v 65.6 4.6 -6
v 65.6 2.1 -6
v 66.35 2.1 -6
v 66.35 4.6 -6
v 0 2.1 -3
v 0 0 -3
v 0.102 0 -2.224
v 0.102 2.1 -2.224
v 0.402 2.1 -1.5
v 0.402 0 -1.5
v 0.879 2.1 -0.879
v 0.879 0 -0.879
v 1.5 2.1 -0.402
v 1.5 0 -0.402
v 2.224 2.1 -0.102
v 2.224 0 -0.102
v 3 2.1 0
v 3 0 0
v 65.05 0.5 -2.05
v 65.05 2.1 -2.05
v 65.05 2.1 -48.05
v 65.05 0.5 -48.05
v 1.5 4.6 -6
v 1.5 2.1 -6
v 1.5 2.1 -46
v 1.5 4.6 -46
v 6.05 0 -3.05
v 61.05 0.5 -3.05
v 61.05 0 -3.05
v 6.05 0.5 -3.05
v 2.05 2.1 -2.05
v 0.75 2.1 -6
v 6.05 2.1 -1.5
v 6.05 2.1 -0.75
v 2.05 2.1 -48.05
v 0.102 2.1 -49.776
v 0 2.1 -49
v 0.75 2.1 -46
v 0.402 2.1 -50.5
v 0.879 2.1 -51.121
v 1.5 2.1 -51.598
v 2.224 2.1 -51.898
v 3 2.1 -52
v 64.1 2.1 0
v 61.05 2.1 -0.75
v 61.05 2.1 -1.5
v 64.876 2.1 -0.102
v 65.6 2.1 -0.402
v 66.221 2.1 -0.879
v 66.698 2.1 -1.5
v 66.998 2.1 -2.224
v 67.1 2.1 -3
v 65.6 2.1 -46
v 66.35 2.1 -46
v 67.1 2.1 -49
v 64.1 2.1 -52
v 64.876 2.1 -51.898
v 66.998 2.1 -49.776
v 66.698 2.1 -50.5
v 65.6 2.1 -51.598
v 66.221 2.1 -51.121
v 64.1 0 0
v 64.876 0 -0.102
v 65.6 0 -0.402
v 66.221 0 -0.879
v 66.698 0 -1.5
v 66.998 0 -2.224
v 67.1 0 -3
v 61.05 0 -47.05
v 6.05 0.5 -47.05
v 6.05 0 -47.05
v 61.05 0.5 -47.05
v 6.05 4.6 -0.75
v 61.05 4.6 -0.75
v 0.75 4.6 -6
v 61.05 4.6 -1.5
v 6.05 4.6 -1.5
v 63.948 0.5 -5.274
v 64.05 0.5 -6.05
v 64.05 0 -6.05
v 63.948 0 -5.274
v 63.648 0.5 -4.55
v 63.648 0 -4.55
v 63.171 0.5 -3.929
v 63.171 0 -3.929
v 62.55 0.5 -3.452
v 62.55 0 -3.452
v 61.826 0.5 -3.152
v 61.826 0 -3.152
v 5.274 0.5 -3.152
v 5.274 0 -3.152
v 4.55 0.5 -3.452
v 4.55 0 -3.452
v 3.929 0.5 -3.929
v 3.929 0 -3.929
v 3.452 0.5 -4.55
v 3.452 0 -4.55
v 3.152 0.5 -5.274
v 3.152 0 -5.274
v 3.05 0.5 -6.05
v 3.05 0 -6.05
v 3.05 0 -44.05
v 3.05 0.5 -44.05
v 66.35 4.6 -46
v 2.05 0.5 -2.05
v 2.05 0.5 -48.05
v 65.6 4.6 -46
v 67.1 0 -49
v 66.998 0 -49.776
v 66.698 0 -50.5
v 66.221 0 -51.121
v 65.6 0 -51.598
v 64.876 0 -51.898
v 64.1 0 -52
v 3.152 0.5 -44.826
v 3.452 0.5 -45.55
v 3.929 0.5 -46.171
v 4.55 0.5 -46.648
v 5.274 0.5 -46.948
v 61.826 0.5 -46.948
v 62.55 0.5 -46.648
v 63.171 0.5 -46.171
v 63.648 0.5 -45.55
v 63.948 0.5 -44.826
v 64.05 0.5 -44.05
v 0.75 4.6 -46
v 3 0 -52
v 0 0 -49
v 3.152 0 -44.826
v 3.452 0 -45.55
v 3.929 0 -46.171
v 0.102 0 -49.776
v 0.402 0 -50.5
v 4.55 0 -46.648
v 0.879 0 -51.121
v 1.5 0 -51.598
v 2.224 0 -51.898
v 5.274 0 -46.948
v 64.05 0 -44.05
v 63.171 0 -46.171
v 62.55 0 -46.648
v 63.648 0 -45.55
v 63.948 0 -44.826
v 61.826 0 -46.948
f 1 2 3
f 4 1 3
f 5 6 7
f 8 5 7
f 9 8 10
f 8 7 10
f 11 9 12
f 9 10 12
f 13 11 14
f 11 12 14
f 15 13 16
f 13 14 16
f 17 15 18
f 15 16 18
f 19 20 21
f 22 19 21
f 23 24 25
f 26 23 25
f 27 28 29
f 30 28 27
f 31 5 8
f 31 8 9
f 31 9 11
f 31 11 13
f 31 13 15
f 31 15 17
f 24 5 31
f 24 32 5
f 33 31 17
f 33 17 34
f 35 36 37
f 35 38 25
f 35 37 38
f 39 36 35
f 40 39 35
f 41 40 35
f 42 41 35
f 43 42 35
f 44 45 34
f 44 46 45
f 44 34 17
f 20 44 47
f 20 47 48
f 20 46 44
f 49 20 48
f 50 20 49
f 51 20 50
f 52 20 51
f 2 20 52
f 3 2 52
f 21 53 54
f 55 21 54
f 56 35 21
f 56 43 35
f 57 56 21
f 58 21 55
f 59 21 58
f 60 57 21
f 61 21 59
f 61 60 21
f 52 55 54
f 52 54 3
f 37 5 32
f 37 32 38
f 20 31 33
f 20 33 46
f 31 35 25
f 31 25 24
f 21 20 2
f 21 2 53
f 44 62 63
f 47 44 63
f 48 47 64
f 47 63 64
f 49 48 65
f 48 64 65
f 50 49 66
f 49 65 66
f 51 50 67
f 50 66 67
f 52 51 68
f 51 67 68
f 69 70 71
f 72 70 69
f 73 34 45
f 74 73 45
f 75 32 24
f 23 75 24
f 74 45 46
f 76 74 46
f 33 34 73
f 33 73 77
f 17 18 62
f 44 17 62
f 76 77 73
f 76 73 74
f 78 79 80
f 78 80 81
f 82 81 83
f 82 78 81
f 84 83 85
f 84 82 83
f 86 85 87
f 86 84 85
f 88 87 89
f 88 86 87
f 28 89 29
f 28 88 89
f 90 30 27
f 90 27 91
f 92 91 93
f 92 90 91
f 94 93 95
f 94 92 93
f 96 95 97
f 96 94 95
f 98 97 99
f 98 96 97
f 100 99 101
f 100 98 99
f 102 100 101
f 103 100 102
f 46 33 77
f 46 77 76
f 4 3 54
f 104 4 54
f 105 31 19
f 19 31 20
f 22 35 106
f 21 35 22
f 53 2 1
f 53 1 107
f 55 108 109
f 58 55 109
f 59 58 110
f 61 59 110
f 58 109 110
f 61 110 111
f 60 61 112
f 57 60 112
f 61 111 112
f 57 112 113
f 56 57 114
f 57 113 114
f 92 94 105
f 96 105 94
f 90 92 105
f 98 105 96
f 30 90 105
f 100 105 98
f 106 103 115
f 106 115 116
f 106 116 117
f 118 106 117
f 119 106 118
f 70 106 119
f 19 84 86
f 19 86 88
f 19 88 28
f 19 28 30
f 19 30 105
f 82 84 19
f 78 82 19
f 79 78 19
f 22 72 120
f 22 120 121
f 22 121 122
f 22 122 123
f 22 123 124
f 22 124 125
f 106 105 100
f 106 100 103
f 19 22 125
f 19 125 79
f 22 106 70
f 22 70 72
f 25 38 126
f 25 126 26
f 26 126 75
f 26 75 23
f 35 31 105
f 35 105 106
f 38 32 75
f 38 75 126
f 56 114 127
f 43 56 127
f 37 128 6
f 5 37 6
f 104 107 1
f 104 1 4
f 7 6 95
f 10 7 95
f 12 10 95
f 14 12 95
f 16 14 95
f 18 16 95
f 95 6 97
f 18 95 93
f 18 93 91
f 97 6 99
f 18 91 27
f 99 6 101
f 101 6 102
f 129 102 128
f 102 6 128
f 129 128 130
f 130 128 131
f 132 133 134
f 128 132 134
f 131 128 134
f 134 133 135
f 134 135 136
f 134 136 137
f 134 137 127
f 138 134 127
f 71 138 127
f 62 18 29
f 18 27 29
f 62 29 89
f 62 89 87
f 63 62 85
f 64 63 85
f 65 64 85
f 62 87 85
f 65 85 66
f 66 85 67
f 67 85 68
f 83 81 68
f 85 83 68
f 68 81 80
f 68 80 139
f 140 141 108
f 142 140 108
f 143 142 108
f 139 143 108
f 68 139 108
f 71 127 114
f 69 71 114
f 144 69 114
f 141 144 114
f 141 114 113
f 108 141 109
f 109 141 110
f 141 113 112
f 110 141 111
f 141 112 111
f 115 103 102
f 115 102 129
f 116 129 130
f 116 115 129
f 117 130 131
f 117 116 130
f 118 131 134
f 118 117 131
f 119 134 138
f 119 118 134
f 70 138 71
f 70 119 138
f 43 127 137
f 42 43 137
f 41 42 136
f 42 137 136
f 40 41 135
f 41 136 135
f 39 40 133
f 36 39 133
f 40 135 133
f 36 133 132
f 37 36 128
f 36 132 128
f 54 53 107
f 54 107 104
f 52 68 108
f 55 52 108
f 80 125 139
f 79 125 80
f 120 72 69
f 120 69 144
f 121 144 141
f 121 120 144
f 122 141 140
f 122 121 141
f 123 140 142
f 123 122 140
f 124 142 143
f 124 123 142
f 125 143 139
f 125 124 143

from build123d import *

# Parameters (mm, degrees)
BOSS_EXTRUDE1_DEPTH = 2.1
SKETCH3_W           = 63
SKETCH3_H           = 46
CUT_EXTRUDE1_DEPTH  = 1.6
CUT_EXTRUDE2_DEPTH  = 0.5
SKETCH6_W           = 0.75
SKETCH6_H           = 40
SKETCH6_W_2         = 55
SKETCH6_H_2         = 0.75
BOSS_EXTRUDE2_DEPTH = 2.5


with BuildPart() as part:
    # Sketch1 → Boss-Extrude1 (new body)
    with BuildSketch(Plane(origin=(0, 0, 0), x_dir=(1, 0, 0), z_dir=(0, 1, 0))):
        with BuildLine():
            Line((3, 0), (64.1, 0))
            ThreePointArc((64.1, 0), (66.221320344, 0.878679656), (67.1, 3))
            Line((67.1, 3), (67.1, 49))
            ThreePointArc((67.1, 49), (66.221320344, 51.121320344), (64.1, 52))
            Line((64.1, 52), (3, 52))
            ThreePointArc((3, 52), (0.878679656, 51.121320344), (0, 49))
            Line((0, 49), (0, 3))
            ThreePointArc((0, 3), (0.878679656, 0.878679656), (3, 0))
        make_face()
    extrude(amount=BOSS_EXTRUDE1_DEPTH)

    # Sketch3 → Cut-Extrude1 (cut)
    with BuildSketch(Plane(origin=(0, 2.1, 0), x_dir=(1, 0, 0), z_dir=(0, 1, 0))):
        with Locations((33.55, 25.05)):
            Rectangle(SKETCH3_W, SKETCH3_H)
    extrude(amount=-CUT_EXTRUDE1_DEPTH, mode=Mode.SUBTRACT)

    # Sketch5 → Cut-Extrude2 (cut)
    with BuildSketch(Plane(origin=(0, 0.5, 0), x_dir=(1, 0, 0), z_dir=(0, 1, 0))):
        with BuildLine():
            Line((6.05, 47.05), (61.05, 47.05))
            ThreePointArc((61.05, 47.05), (63.171320344, 46.171320344), (64.05, 44.05))
            Line((64.05, 44.05), (64.05, 6.05))
            ThreePointArc((64.05, 6.05), (63.171320344, 3.928679656), (61.05, 3.05))
            Line((61.05, 3.05), (6.05, 3.05))
            ThreePointArc((6.05, 3.05), (3.928679656, 3.928679656), (3.05, 6.05))
            Line((3.05, 6.05), (3.05, 44.05))
            ThreePointArc((3.05, 44.05), (3.928679656, 46.171320344), (6.05, 47.05))
        make_face()
    extrude(amount=-CUT_EXTRUDE2_DEPTH, mode=Mode.SUBTRACT)

    # Sketch6 → Boss-Extrude2 (add)
    with BuildSketch(Plane(origin=(0, 2.1, 0), x_dir=(1, 0, 0), z_dir=(0, 1, 0))):
        with Locations((65.975, 26)):
            Rectangle(SKETCH6_W, SKETCH6_H)
        with Locations((1.125, 26)):
            Rectangle(SKETCH6_W, SKETCH6_H)
        with Locations((33.55, 1.125)):
            Rectangle(SKETCH6_W_2, SKETCH6_H_2)
    extrude(amount=BOSS_EXTRUDE2_DEPTH)


solid = part.part
